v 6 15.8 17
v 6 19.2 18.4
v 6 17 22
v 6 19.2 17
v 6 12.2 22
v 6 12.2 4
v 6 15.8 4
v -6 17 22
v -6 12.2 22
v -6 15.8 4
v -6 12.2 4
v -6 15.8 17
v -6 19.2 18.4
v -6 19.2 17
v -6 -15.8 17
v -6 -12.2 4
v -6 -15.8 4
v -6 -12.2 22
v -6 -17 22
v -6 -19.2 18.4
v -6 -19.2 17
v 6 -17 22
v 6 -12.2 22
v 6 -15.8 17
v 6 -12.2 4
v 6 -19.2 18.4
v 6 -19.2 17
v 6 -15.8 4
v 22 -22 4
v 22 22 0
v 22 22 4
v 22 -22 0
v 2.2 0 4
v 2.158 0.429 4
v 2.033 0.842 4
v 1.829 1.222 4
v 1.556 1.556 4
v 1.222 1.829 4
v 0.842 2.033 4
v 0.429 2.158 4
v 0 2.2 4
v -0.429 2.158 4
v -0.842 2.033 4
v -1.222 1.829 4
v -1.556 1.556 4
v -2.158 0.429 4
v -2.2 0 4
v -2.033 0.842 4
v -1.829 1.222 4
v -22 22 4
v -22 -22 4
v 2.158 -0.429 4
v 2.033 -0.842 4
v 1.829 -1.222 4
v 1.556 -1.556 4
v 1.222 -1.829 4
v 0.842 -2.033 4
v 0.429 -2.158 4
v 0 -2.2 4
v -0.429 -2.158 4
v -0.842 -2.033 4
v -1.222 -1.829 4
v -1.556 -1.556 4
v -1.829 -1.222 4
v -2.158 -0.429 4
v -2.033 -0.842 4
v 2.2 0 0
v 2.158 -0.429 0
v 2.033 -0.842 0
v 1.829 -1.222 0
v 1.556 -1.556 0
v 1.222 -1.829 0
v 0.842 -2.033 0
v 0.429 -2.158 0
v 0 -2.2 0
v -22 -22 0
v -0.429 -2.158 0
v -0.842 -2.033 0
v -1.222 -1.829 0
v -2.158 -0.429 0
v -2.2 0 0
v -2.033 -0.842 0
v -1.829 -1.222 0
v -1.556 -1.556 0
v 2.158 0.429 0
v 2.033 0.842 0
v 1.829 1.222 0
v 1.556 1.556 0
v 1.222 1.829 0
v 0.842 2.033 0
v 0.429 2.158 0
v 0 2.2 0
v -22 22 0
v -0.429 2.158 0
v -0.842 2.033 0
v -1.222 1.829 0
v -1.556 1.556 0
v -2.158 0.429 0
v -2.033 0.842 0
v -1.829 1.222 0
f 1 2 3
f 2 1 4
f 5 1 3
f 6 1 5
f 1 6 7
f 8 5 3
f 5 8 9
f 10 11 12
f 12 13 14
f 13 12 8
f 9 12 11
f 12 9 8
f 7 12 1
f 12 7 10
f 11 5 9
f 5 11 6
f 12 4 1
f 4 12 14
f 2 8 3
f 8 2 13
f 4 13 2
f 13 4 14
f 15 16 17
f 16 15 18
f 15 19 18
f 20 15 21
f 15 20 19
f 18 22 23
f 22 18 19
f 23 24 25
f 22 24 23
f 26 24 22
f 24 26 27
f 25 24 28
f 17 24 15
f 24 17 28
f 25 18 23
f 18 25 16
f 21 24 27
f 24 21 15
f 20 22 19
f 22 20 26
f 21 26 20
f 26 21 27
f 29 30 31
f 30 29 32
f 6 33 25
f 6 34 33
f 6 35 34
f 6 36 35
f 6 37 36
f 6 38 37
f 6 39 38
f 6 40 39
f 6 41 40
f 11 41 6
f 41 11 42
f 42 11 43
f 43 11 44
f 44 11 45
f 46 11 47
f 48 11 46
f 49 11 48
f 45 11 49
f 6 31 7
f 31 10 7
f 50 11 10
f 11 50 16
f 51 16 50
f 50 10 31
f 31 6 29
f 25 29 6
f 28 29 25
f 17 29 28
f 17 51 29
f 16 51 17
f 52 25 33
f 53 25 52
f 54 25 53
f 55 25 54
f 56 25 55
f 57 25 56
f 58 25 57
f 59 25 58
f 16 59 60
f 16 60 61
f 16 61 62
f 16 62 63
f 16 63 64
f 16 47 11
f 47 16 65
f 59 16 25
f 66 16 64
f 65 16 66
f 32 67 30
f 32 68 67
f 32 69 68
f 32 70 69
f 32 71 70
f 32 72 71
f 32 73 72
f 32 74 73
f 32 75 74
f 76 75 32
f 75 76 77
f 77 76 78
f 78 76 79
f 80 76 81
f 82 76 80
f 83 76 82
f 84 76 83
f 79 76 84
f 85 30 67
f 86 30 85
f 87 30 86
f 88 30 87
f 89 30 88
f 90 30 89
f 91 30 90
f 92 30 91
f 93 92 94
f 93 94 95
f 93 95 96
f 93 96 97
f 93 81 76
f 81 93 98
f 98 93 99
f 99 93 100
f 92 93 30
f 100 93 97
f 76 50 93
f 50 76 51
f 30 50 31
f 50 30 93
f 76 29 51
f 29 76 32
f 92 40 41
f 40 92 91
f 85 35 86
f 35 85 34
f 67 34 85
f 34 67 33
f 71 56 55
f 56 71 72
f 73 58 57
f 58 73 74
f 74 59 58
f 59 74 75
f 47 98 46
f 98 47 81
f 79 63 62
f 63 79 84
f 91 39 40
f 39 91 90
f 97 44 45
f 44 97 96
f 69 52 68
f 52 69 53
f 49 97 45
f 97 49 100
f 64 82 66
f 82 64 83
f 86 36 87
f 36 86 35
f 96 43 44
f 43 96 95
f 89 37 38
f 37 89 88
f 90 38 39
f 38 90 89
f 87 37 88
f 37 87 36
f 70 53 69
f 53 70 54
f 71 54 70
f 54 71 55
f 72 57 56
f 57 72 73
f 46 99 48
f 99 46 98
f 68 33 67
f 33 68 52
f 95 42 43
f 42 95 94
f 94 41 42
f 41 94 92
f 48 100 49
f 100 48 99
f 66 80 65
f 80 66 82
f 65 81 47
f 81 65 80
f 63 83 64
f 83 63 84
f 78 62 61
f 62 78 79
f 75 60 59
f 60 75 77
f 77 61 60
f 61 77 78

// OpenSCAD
$fn = 32;

// ----------------------------------------------------------------------
// Snap-fit latch: 2 arms, 18 mm tall, 3.6 mm undercut hooks
// ----------------------------------------------------------------------

// --- parameters (mm) ---
base_d = 44;              // base plate depth
base_h = 4;               // base plate thickness
span = 28;                // distance between opposite arms
arm_t = 3.6;              // arm thickness
arm_d = 12;               // arm width
height = 18;              // free arm length
head_len = 3.6;           // hook reach
head_h = 5;               // hook height
lead = 1.4;               // lead-in ramp thickness
bore_d = 4.4;             // base fixing bore
top_z = 22;               // height of the arm tips above the base

arms = 2;

difference() {
  union() {
    /* base plate, centred on the arm ring */
    translate([-22, -22, 0]) cube([base_d, base_d, base_h]);
    for (a = [0 : 360 / arms : 359]) rotate([0, 0, a]) {
    /* arm, sunk 0.5 mm into the base */
    translate([-arm_d / 2, span / 2 - arm_t / 2, base_h - 0.5]) cube([arm_d, arm_t, height + 0.5]);
    /* hook: a convex hull of a tall inner block and a thin outer lip
       gives a flat undercut below and a lead-in ramp on top */
    hull() {
      translate([-arm_d / 2, span / 2 + arm_t / 2 - 0.6, top_z - head_h]) cube([arm_d, lead + 0.4, head_h]);
      translate([-arm_d / 2, span / 2 + arm_t / 2 - 0.2, top_z - head_h]) cube([arm_d, head_len, lead]);
    }
    }
  }
  translate([0, 0, -2.5]) cylinder(h = base_h + 5, d = bore_d);
}
